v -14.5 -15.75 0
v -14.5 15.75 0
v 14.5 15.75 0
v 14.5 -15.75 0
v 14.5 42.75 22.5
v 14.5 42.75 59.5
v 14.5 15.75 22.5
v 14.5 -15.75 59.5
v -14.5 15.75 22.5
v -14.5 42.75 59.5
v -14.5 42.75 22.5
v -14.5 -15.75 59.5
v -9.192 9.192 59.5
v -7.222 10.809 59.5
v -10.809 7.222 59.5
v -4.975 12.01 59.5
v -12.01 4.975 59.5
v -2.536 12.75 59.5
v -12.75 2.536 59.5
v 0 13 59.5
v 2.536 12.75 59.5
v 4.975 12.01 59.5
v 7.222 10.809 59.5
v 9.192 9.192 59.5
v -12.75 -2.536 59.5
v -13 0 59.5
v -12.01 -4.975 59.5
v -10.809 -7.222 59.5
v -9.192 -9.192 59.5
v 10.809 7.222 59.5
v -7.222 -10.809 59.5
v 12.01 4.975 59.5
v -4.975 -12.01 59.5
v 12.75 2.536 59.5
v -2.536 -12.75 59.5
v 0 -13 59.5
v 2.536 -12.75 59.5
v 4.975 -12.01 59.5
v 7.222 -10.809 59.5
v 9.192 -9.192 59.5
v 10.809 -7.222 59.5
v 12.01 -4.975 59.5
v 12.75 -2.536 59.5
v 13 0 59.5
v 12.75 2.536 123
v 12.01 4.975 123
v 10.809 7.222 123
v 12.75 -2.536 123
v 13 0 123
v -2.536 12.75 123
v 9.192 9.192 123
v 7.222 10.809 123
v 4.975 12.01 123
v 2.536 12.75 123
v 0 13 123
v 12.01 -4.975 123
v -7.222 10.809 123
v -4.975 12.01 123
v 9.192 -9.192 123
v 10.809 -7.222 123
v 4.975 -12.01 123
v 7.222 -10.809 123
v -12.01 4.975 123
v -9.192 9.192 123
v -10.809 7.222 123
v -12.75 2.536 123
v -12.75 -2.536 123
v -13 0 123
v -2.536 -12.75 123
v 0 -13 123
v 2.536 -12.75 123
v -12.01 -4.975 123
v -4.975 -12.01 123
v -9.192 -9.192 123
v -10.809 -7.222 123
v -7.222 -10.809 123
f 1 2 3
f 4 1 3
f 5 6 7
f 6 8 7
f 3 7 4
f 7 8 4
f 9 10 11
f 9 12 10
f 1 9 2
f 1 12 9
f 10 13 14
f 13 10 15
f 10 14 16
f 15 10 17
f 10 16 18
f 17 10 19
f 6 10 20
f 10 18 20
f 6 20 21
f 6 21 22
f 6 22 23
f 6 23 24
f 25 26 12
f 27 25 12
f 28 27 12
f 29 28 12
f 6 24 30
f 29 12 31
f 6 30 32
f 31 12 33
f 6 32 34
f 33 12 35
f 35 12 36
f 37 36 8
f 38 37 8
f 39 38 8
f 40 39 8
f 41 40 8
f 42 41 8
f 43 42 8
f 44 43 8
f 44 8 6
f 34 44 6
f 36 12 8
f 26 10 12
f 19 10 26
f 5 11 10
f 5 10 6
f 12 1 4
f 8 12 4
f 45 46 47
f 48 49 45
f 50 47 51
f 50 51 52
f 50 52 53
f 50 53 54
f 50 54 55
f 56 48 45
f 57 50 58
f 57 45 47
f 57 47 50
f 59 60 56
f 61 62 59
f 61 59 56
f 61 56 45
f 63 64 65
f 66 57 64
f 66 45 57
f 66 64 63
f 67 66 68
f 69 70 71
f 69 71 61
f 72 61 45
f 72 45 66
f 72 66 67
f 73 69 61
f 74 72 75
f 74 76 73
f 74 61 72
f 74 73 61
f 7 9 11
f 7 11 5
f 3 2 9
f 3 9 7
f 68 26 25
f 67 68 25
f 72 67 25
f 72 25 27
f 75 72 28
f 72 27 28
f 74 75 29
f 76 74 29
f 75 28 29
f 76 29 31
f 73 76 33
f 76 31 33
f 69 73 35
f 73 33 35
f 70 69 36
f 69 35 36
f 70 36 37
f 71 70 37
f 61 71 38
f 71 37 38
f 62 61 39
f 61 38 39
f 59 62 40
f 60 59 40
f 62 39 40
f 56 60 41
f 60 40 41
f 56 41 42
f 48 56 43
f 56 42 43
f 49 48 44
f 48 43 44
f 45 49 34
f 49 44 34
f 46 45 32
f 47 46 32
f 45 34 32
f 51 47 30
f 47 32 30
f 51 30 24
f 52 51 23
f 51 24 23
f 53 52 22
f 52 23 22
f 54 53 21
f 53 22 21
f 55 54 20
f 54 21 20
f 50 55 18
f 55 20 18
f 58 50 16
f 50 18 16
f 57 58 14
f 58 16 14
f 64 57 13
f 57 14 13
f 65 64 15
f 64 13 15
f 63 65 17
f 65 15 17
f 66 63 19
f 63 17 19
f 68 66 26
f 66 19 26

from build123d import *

# Parameters (mm, degrees)
SKETCH1_W           = 29
SKETCH1_H           = 31.5
BOSS_EXTRUDE1_DEPTH = 59.5
BOSS_EXTRUDE2_START = 15.75
SKETCH2_W           = 29
SKETCH2_H           = 37
BOSS_EXTRUDE2_DEPTH = 27
BOSS_EXTRUDE3_START = 59.5
SKETCH4_R           = 13
BOSS_EXTRUDE3_DEPTH = 63.5


with BuildPart() as part:
    # Sketch1 → Boss-Extrude1 (new body)
    with BuildSketch(Plane.XY):
        Rectangle(SKETCH1_W, SKETCH1_H)
    extrude(amount=BOSS_EXTRUDE1_DEPTH)

    # Sketch2 → Boss-Extrude2 (add)
    with BuildSketch(Plane(origin=(0, 0, 0), x_dir=(1, 0, 0), z_dir=(0, 1, 0)).offset(BOSS_EXTRUDE2_START)):
        with Locations((0, -41)):
            Rectangle(SKETCH2_W, SKETCH2_H)
    extrude(amount=BOSS_EXTRUDE2_DEPTH)

    # Sketch4 → Boss-Extrude3 (add)
    with BuildSketch(Plane.XY.offset(BOSS_EXTRUDE3_START)):
        with Locations(Location((0, 0, 0), (0, 0, 180))):
            Circle(SKETCH4_R)
    extrude(amount=BOSS_EXTRUDE3_DEPTH)


solid = part.part
